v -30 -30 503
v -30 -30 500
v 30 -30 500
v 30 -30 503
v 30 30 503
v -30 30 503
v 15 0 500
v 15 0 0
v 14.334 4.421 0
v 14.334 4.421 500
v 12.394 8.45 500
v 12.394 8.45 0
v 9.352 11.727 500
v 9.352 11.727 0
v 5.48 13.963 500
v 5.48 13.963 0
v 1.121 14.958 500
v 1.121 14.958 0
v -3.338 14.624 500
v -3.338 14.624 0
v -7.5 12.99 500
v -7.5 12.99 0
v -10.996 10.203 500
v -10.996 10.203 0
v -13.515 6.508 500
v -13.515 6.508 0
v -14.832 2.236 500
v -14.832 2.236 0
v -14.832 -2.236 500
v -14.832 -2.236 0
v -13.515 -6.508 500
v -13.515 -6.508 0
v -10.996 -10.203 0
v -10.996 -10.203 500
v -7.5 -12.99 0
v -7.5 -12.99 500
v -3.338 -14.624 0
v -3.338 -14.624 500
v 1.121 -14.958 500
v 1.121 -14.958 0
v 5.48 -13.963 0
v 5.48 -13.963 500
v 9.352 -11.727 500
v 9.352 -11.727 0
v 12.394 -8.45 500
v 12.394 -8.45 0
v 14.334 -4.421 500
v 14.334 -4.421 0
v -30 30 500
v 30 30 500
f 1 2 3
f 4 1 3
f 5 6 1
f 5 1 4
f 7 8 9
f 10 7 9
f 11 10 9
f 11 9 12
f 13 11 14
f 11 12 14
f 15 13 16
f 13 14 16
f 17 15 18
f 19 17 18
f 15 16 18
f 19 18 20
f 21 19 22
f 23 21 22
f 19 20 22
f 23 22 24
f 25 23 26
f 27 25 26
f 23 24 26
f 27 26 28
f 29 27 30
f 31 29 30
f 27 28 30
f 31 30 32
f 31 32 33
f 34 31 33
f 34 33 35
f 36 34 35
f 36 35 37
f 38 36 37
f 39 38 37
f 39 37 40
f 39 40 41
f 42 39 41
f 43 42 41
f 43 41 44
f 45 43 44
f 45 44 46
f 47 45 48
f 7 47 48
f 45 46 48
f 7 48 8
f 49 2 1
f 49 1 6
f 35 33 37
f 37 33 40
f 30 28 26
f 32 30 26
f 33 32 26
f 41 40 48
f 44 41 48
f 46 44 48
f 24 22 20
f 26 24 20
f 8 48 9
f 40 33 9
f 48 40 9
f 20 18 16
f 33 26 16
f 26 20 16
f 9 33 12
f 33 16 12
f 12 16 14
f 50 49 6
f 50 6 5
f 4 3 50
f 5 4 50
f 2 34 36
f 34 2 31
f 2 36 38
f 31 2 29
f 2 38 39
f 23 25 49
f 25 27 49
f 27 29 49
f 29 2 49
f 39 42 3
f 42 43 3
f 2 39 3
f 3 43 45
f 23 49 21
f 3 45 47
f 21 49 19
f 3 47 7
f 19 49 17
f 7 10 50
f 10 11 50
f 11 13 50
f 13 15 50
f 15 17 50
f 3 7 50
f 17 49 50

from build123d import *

# Parameters (mm, degrees)
F0_R     = 15
F1_DEPTH = 500
F2_W     = 60
F2_H     = 60
F2_R     = 15
F3_DEPTH = 3


with BuildPart() as f1:
    # F0 (on Top) → F1 (new body)
    with BuildSketch(Plane.XY):
        Circle(F0_R)
    extrude(amount=F1_DEPTH)

    # F2 (on face) → F3 (join)
    with BuildSketch(Plane.XY.offset(500)):
        Rectangle(F2_W, F2_H)
        Circle(F2_R, mode=Mode.SUBTRACT)
        Rectangle(F2_W, F2_H)
    extrude(amount=F3_DEPTH)


solid = f1.part
